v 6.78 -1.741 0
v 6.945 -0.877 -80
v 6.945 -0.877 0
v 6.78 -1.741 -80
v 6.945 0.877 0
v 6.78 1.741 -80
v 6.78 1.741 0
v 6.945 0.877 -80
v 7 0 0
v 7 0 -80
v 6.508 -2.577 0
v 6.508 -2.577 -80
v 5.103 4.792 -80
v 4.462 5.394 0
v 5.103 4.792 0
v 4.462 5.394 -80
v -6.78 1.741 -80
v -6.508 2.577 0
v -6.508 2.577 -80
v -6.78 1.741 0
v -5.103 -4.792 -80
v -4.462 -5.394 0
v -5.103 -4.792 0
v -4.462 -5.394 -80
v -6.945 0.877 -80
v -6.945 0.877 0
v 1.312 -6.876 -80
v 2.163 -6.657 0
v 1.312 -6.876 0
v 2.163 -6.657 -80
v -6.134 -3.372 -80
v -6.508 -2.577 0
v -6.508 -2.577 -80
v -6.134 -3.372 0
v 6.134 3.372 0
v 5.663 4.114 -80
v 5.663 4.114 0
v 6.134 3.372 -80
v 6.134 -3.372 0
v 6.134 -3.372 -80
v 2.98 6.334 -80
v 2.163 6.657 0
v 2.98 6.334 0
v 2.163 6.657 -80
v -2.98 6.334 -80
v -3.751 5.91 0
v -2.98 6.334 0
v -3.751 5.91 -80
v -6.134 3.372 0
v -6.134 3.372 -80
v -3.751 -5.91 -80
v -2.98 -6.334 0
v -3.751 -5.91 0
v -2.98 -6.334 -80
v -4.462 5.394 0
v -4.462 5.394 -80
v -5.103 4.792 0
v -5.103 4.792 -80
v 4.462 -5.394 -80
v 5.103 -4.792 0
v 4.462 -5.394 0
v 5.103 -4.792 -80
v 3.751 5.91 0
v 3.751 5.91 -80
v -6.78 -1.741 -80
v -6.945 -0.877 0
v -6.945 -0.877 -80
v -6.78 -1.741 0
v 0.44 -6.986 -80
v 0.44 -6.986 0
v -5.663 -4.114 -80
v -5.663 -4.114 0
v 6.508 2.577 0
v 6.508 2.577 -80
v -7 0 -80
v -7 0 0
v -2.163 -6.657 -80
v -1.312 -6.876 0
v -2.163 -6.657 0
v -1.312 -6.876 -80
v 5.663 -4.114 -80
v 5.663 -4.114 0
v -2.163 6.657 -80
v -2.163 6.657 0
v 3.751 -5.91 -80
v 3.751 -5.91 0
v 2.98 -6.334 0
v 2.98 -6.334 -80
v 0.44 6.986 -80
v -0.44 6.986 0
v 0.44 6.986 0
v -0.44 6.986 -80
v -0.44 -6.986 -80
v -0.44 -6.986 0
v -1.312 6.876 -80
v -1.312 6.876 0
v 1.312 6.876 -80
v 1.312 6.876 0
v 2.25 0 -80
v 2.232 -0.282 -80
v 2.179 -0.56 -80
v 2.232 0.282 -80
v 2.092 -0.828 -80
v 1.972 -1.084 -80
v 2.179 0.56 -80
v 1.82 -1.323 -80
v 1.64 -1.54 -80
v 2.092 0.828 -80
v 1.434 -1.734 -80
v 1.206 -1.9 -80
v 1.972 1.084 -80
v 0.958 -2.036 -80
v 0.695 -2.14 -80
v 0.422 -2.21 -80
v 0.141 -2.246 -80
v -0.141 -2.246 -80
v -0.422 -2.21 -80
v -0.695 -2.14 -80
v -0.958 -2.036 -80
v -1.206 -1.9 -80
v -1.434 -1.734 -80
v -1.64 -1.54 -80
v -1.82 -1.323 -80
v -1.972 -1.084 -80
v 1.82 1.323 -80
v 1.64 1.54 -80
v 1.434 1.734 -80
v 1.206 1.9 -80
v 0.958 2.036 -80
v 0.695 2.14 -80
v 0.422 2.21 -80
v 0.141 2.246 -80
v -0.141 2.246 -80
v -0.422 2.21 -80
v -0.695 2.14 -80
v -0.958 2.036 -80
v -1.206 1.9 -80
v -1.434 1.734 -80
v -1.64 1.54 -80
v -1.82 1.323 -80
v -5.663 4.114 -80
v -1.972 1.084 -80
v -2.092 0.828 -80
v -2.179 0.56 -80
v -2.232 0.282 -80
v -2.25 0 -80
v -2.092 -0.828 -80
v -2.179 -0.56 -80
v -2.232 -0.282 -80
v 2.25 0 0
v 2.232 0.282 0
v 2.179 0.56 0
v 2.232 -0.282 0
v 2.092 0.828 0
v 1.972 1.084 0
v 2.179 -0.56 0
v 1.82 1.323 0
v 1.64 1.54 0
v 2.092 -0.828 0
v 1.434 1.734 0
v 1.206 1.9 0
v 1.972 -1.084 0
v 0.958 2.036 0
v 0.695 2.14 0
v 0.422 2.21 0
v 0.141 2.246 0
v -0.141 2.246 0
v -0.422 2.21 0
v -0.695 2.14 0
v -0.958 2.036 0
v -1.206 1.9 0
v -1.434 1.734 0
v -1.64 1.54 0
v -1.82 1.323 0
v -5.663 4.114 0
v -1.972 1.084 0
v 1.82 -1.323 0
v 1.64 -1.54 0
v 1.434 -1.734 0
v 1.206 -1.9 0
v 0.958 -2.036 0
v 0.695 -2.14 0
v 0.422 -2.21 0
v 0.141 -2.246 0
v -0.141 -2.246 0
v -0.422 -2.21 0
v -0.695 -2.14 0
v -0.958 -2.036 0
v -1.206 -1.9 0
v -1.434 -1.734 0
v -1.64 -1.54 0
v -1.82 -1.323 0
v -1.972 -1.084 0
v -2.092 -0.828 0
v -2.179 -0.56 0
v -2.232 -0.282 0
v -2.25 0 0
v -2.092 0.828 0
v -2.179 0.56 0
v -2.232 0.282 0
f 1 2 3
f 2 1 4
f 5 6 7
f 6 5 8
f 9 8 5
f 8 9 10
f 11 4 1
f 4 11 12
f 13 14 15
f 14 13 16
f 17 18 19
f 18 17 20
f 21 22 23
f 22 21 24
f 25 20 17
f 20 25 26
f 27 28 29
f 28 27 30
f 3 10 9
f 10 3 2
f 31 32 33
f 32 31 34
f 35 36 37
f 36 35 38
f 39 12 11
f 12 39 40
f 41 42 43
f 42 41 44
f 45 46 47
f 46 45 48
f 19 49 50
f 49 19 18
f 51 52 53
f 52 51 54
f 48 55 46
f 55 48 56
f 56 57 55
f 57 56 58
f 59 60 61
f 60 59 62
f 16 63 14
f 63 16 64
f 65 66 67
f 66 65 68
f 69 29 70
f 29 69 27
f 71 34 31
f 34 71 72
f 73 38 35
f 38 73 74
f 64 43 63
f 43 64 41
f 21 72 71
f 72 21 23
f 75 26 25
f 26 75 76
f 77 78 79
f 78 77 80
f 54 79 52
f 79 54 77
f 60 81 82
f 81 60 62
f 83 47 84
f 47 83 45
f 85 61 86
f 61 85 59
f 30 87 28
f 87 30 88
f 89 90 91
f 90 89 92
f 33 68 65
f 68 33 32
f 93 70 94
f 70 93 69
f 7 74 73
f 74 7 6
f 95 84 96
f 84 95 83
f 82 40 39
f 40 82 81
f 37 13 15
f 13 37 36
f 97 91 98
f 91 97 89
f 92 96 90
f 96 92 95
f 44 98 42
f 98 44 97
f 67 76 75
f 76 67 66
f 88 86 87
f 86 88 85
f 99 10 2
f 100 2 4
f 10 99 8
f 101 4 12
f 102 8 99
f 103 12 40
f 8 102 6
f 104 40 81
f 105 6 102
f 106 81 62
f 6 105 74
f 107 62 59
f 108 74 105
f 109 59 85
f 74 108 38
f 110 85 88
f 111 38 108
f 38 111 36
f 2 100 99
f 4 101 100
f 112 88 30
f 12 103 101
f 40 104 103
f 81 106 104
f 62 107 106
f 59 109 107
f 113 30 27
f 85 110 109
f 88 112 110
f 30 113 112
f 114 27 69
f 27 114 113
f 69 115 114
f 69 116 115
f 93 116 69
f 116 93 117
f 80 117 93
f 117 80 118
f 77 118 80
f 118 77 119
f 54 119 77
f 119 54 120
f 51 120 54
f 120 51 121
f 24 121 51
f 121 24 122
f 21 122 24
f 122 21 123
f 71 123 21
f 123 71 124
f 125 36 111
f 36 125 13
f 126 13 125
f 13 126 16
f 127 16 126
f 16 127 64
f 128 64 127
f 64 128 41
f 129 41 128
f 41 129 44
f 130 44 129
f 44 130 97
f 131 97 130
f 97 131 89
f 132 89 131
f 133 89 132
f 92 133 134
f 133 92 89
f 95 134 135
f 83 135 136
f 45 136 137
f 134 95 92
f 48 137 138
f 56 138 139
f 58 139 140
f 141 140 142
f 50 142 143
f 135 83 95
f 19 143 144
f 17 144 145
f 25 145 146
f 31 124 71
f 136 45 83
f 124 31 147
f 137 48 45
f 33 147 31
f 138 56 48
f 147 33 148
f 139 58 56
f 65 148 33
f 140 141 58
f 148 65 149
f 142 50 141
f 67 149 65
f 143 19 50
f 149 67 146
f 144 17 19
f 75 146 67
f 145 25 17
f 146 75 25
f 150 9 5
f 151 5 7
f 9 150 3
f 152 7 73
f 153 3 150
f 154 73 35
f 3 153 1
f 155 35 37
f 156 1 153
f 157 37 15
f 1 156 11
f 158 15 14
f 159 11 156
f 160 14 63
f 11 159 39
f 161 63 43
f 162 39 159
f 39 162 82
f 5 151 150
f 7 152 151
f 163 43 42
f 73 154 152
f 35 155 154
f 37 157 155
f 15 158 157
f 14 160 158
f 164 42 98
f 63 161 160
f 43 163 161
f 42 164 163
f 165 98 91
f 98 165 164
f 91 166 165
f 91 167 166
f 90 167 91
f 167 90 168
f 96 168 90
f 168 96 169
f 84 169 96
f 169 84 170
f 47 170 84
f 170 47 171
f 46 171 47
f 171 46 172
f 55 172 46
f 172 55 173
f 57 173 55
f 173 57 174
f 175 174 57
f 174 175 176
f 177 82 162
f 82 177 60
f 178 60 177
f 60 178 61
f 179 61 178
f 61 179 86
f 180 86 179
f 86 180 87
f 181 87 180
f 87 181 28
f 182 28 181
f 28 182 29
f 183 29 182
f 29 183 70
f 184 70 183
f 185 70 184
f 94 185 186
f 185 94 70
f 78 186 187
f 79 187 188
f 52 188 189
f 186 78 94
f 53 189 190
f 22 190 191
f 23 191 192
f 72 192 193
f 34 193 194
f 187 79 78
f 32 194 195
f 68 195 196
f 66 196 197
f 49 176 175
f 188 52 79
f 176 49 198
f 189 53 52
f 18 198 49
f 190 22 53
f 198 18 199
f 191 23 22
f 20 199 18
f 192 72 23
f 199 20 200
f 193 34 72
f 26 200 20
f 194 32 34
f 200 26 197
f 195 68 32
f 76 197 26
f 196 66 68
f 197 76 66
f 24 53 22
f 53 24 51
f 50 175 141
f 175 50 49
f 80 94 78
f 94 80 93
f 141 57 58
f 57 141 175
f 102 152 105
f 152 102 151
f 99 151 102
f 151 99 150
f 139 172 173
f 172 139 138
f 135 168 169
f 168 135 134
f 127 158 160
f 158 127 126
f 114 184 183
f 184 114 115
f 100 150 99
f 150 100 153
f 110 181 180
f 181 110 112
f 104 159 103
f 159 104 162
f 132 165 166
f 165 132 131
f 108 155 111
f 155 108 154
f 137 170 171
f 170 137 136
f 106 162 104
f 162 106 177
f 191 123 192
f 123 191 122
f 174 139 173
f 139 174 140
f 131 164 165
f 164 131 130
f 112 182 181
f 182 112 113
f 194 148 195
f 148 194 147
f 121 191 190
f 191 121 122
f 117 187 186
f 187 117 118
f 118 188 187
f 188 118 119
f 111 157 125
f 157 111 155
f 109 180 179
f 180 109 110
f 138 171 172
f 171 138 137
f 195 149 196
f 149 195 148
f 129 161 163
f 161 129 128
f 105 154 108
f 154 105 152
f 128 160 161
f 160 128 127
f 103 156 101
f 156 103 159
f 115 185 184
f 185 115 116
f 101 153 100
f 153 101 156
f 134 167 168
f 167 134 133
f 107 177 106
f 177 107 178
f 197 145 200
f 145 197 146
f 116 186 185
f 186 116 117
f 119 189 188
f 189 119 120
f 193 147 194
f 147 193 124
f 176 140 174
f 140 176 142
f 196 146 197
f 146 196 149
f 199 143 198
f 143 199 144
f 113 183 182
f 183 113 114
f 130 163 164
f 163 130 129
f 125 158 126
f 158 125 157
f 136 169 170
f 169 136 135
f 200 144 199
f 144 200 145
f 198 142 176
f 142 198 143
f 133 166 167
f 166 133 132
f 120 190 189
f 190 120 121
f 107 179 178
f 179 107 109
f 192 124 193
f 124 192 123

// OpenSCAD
$fn = 50;


difference() {
	union() {
		translate(v = [0, 0, -80.0000000000]) {
			cylinder(h = 80, r = 7.0000000000);
		}
		cylinder(h = 0, r = 13.0000000000);
	}
	union() {
		#translate(v = [0, 0, -80]) {
			cylinder(h = 80, r = 2.2500000000);
		}
	}
}
